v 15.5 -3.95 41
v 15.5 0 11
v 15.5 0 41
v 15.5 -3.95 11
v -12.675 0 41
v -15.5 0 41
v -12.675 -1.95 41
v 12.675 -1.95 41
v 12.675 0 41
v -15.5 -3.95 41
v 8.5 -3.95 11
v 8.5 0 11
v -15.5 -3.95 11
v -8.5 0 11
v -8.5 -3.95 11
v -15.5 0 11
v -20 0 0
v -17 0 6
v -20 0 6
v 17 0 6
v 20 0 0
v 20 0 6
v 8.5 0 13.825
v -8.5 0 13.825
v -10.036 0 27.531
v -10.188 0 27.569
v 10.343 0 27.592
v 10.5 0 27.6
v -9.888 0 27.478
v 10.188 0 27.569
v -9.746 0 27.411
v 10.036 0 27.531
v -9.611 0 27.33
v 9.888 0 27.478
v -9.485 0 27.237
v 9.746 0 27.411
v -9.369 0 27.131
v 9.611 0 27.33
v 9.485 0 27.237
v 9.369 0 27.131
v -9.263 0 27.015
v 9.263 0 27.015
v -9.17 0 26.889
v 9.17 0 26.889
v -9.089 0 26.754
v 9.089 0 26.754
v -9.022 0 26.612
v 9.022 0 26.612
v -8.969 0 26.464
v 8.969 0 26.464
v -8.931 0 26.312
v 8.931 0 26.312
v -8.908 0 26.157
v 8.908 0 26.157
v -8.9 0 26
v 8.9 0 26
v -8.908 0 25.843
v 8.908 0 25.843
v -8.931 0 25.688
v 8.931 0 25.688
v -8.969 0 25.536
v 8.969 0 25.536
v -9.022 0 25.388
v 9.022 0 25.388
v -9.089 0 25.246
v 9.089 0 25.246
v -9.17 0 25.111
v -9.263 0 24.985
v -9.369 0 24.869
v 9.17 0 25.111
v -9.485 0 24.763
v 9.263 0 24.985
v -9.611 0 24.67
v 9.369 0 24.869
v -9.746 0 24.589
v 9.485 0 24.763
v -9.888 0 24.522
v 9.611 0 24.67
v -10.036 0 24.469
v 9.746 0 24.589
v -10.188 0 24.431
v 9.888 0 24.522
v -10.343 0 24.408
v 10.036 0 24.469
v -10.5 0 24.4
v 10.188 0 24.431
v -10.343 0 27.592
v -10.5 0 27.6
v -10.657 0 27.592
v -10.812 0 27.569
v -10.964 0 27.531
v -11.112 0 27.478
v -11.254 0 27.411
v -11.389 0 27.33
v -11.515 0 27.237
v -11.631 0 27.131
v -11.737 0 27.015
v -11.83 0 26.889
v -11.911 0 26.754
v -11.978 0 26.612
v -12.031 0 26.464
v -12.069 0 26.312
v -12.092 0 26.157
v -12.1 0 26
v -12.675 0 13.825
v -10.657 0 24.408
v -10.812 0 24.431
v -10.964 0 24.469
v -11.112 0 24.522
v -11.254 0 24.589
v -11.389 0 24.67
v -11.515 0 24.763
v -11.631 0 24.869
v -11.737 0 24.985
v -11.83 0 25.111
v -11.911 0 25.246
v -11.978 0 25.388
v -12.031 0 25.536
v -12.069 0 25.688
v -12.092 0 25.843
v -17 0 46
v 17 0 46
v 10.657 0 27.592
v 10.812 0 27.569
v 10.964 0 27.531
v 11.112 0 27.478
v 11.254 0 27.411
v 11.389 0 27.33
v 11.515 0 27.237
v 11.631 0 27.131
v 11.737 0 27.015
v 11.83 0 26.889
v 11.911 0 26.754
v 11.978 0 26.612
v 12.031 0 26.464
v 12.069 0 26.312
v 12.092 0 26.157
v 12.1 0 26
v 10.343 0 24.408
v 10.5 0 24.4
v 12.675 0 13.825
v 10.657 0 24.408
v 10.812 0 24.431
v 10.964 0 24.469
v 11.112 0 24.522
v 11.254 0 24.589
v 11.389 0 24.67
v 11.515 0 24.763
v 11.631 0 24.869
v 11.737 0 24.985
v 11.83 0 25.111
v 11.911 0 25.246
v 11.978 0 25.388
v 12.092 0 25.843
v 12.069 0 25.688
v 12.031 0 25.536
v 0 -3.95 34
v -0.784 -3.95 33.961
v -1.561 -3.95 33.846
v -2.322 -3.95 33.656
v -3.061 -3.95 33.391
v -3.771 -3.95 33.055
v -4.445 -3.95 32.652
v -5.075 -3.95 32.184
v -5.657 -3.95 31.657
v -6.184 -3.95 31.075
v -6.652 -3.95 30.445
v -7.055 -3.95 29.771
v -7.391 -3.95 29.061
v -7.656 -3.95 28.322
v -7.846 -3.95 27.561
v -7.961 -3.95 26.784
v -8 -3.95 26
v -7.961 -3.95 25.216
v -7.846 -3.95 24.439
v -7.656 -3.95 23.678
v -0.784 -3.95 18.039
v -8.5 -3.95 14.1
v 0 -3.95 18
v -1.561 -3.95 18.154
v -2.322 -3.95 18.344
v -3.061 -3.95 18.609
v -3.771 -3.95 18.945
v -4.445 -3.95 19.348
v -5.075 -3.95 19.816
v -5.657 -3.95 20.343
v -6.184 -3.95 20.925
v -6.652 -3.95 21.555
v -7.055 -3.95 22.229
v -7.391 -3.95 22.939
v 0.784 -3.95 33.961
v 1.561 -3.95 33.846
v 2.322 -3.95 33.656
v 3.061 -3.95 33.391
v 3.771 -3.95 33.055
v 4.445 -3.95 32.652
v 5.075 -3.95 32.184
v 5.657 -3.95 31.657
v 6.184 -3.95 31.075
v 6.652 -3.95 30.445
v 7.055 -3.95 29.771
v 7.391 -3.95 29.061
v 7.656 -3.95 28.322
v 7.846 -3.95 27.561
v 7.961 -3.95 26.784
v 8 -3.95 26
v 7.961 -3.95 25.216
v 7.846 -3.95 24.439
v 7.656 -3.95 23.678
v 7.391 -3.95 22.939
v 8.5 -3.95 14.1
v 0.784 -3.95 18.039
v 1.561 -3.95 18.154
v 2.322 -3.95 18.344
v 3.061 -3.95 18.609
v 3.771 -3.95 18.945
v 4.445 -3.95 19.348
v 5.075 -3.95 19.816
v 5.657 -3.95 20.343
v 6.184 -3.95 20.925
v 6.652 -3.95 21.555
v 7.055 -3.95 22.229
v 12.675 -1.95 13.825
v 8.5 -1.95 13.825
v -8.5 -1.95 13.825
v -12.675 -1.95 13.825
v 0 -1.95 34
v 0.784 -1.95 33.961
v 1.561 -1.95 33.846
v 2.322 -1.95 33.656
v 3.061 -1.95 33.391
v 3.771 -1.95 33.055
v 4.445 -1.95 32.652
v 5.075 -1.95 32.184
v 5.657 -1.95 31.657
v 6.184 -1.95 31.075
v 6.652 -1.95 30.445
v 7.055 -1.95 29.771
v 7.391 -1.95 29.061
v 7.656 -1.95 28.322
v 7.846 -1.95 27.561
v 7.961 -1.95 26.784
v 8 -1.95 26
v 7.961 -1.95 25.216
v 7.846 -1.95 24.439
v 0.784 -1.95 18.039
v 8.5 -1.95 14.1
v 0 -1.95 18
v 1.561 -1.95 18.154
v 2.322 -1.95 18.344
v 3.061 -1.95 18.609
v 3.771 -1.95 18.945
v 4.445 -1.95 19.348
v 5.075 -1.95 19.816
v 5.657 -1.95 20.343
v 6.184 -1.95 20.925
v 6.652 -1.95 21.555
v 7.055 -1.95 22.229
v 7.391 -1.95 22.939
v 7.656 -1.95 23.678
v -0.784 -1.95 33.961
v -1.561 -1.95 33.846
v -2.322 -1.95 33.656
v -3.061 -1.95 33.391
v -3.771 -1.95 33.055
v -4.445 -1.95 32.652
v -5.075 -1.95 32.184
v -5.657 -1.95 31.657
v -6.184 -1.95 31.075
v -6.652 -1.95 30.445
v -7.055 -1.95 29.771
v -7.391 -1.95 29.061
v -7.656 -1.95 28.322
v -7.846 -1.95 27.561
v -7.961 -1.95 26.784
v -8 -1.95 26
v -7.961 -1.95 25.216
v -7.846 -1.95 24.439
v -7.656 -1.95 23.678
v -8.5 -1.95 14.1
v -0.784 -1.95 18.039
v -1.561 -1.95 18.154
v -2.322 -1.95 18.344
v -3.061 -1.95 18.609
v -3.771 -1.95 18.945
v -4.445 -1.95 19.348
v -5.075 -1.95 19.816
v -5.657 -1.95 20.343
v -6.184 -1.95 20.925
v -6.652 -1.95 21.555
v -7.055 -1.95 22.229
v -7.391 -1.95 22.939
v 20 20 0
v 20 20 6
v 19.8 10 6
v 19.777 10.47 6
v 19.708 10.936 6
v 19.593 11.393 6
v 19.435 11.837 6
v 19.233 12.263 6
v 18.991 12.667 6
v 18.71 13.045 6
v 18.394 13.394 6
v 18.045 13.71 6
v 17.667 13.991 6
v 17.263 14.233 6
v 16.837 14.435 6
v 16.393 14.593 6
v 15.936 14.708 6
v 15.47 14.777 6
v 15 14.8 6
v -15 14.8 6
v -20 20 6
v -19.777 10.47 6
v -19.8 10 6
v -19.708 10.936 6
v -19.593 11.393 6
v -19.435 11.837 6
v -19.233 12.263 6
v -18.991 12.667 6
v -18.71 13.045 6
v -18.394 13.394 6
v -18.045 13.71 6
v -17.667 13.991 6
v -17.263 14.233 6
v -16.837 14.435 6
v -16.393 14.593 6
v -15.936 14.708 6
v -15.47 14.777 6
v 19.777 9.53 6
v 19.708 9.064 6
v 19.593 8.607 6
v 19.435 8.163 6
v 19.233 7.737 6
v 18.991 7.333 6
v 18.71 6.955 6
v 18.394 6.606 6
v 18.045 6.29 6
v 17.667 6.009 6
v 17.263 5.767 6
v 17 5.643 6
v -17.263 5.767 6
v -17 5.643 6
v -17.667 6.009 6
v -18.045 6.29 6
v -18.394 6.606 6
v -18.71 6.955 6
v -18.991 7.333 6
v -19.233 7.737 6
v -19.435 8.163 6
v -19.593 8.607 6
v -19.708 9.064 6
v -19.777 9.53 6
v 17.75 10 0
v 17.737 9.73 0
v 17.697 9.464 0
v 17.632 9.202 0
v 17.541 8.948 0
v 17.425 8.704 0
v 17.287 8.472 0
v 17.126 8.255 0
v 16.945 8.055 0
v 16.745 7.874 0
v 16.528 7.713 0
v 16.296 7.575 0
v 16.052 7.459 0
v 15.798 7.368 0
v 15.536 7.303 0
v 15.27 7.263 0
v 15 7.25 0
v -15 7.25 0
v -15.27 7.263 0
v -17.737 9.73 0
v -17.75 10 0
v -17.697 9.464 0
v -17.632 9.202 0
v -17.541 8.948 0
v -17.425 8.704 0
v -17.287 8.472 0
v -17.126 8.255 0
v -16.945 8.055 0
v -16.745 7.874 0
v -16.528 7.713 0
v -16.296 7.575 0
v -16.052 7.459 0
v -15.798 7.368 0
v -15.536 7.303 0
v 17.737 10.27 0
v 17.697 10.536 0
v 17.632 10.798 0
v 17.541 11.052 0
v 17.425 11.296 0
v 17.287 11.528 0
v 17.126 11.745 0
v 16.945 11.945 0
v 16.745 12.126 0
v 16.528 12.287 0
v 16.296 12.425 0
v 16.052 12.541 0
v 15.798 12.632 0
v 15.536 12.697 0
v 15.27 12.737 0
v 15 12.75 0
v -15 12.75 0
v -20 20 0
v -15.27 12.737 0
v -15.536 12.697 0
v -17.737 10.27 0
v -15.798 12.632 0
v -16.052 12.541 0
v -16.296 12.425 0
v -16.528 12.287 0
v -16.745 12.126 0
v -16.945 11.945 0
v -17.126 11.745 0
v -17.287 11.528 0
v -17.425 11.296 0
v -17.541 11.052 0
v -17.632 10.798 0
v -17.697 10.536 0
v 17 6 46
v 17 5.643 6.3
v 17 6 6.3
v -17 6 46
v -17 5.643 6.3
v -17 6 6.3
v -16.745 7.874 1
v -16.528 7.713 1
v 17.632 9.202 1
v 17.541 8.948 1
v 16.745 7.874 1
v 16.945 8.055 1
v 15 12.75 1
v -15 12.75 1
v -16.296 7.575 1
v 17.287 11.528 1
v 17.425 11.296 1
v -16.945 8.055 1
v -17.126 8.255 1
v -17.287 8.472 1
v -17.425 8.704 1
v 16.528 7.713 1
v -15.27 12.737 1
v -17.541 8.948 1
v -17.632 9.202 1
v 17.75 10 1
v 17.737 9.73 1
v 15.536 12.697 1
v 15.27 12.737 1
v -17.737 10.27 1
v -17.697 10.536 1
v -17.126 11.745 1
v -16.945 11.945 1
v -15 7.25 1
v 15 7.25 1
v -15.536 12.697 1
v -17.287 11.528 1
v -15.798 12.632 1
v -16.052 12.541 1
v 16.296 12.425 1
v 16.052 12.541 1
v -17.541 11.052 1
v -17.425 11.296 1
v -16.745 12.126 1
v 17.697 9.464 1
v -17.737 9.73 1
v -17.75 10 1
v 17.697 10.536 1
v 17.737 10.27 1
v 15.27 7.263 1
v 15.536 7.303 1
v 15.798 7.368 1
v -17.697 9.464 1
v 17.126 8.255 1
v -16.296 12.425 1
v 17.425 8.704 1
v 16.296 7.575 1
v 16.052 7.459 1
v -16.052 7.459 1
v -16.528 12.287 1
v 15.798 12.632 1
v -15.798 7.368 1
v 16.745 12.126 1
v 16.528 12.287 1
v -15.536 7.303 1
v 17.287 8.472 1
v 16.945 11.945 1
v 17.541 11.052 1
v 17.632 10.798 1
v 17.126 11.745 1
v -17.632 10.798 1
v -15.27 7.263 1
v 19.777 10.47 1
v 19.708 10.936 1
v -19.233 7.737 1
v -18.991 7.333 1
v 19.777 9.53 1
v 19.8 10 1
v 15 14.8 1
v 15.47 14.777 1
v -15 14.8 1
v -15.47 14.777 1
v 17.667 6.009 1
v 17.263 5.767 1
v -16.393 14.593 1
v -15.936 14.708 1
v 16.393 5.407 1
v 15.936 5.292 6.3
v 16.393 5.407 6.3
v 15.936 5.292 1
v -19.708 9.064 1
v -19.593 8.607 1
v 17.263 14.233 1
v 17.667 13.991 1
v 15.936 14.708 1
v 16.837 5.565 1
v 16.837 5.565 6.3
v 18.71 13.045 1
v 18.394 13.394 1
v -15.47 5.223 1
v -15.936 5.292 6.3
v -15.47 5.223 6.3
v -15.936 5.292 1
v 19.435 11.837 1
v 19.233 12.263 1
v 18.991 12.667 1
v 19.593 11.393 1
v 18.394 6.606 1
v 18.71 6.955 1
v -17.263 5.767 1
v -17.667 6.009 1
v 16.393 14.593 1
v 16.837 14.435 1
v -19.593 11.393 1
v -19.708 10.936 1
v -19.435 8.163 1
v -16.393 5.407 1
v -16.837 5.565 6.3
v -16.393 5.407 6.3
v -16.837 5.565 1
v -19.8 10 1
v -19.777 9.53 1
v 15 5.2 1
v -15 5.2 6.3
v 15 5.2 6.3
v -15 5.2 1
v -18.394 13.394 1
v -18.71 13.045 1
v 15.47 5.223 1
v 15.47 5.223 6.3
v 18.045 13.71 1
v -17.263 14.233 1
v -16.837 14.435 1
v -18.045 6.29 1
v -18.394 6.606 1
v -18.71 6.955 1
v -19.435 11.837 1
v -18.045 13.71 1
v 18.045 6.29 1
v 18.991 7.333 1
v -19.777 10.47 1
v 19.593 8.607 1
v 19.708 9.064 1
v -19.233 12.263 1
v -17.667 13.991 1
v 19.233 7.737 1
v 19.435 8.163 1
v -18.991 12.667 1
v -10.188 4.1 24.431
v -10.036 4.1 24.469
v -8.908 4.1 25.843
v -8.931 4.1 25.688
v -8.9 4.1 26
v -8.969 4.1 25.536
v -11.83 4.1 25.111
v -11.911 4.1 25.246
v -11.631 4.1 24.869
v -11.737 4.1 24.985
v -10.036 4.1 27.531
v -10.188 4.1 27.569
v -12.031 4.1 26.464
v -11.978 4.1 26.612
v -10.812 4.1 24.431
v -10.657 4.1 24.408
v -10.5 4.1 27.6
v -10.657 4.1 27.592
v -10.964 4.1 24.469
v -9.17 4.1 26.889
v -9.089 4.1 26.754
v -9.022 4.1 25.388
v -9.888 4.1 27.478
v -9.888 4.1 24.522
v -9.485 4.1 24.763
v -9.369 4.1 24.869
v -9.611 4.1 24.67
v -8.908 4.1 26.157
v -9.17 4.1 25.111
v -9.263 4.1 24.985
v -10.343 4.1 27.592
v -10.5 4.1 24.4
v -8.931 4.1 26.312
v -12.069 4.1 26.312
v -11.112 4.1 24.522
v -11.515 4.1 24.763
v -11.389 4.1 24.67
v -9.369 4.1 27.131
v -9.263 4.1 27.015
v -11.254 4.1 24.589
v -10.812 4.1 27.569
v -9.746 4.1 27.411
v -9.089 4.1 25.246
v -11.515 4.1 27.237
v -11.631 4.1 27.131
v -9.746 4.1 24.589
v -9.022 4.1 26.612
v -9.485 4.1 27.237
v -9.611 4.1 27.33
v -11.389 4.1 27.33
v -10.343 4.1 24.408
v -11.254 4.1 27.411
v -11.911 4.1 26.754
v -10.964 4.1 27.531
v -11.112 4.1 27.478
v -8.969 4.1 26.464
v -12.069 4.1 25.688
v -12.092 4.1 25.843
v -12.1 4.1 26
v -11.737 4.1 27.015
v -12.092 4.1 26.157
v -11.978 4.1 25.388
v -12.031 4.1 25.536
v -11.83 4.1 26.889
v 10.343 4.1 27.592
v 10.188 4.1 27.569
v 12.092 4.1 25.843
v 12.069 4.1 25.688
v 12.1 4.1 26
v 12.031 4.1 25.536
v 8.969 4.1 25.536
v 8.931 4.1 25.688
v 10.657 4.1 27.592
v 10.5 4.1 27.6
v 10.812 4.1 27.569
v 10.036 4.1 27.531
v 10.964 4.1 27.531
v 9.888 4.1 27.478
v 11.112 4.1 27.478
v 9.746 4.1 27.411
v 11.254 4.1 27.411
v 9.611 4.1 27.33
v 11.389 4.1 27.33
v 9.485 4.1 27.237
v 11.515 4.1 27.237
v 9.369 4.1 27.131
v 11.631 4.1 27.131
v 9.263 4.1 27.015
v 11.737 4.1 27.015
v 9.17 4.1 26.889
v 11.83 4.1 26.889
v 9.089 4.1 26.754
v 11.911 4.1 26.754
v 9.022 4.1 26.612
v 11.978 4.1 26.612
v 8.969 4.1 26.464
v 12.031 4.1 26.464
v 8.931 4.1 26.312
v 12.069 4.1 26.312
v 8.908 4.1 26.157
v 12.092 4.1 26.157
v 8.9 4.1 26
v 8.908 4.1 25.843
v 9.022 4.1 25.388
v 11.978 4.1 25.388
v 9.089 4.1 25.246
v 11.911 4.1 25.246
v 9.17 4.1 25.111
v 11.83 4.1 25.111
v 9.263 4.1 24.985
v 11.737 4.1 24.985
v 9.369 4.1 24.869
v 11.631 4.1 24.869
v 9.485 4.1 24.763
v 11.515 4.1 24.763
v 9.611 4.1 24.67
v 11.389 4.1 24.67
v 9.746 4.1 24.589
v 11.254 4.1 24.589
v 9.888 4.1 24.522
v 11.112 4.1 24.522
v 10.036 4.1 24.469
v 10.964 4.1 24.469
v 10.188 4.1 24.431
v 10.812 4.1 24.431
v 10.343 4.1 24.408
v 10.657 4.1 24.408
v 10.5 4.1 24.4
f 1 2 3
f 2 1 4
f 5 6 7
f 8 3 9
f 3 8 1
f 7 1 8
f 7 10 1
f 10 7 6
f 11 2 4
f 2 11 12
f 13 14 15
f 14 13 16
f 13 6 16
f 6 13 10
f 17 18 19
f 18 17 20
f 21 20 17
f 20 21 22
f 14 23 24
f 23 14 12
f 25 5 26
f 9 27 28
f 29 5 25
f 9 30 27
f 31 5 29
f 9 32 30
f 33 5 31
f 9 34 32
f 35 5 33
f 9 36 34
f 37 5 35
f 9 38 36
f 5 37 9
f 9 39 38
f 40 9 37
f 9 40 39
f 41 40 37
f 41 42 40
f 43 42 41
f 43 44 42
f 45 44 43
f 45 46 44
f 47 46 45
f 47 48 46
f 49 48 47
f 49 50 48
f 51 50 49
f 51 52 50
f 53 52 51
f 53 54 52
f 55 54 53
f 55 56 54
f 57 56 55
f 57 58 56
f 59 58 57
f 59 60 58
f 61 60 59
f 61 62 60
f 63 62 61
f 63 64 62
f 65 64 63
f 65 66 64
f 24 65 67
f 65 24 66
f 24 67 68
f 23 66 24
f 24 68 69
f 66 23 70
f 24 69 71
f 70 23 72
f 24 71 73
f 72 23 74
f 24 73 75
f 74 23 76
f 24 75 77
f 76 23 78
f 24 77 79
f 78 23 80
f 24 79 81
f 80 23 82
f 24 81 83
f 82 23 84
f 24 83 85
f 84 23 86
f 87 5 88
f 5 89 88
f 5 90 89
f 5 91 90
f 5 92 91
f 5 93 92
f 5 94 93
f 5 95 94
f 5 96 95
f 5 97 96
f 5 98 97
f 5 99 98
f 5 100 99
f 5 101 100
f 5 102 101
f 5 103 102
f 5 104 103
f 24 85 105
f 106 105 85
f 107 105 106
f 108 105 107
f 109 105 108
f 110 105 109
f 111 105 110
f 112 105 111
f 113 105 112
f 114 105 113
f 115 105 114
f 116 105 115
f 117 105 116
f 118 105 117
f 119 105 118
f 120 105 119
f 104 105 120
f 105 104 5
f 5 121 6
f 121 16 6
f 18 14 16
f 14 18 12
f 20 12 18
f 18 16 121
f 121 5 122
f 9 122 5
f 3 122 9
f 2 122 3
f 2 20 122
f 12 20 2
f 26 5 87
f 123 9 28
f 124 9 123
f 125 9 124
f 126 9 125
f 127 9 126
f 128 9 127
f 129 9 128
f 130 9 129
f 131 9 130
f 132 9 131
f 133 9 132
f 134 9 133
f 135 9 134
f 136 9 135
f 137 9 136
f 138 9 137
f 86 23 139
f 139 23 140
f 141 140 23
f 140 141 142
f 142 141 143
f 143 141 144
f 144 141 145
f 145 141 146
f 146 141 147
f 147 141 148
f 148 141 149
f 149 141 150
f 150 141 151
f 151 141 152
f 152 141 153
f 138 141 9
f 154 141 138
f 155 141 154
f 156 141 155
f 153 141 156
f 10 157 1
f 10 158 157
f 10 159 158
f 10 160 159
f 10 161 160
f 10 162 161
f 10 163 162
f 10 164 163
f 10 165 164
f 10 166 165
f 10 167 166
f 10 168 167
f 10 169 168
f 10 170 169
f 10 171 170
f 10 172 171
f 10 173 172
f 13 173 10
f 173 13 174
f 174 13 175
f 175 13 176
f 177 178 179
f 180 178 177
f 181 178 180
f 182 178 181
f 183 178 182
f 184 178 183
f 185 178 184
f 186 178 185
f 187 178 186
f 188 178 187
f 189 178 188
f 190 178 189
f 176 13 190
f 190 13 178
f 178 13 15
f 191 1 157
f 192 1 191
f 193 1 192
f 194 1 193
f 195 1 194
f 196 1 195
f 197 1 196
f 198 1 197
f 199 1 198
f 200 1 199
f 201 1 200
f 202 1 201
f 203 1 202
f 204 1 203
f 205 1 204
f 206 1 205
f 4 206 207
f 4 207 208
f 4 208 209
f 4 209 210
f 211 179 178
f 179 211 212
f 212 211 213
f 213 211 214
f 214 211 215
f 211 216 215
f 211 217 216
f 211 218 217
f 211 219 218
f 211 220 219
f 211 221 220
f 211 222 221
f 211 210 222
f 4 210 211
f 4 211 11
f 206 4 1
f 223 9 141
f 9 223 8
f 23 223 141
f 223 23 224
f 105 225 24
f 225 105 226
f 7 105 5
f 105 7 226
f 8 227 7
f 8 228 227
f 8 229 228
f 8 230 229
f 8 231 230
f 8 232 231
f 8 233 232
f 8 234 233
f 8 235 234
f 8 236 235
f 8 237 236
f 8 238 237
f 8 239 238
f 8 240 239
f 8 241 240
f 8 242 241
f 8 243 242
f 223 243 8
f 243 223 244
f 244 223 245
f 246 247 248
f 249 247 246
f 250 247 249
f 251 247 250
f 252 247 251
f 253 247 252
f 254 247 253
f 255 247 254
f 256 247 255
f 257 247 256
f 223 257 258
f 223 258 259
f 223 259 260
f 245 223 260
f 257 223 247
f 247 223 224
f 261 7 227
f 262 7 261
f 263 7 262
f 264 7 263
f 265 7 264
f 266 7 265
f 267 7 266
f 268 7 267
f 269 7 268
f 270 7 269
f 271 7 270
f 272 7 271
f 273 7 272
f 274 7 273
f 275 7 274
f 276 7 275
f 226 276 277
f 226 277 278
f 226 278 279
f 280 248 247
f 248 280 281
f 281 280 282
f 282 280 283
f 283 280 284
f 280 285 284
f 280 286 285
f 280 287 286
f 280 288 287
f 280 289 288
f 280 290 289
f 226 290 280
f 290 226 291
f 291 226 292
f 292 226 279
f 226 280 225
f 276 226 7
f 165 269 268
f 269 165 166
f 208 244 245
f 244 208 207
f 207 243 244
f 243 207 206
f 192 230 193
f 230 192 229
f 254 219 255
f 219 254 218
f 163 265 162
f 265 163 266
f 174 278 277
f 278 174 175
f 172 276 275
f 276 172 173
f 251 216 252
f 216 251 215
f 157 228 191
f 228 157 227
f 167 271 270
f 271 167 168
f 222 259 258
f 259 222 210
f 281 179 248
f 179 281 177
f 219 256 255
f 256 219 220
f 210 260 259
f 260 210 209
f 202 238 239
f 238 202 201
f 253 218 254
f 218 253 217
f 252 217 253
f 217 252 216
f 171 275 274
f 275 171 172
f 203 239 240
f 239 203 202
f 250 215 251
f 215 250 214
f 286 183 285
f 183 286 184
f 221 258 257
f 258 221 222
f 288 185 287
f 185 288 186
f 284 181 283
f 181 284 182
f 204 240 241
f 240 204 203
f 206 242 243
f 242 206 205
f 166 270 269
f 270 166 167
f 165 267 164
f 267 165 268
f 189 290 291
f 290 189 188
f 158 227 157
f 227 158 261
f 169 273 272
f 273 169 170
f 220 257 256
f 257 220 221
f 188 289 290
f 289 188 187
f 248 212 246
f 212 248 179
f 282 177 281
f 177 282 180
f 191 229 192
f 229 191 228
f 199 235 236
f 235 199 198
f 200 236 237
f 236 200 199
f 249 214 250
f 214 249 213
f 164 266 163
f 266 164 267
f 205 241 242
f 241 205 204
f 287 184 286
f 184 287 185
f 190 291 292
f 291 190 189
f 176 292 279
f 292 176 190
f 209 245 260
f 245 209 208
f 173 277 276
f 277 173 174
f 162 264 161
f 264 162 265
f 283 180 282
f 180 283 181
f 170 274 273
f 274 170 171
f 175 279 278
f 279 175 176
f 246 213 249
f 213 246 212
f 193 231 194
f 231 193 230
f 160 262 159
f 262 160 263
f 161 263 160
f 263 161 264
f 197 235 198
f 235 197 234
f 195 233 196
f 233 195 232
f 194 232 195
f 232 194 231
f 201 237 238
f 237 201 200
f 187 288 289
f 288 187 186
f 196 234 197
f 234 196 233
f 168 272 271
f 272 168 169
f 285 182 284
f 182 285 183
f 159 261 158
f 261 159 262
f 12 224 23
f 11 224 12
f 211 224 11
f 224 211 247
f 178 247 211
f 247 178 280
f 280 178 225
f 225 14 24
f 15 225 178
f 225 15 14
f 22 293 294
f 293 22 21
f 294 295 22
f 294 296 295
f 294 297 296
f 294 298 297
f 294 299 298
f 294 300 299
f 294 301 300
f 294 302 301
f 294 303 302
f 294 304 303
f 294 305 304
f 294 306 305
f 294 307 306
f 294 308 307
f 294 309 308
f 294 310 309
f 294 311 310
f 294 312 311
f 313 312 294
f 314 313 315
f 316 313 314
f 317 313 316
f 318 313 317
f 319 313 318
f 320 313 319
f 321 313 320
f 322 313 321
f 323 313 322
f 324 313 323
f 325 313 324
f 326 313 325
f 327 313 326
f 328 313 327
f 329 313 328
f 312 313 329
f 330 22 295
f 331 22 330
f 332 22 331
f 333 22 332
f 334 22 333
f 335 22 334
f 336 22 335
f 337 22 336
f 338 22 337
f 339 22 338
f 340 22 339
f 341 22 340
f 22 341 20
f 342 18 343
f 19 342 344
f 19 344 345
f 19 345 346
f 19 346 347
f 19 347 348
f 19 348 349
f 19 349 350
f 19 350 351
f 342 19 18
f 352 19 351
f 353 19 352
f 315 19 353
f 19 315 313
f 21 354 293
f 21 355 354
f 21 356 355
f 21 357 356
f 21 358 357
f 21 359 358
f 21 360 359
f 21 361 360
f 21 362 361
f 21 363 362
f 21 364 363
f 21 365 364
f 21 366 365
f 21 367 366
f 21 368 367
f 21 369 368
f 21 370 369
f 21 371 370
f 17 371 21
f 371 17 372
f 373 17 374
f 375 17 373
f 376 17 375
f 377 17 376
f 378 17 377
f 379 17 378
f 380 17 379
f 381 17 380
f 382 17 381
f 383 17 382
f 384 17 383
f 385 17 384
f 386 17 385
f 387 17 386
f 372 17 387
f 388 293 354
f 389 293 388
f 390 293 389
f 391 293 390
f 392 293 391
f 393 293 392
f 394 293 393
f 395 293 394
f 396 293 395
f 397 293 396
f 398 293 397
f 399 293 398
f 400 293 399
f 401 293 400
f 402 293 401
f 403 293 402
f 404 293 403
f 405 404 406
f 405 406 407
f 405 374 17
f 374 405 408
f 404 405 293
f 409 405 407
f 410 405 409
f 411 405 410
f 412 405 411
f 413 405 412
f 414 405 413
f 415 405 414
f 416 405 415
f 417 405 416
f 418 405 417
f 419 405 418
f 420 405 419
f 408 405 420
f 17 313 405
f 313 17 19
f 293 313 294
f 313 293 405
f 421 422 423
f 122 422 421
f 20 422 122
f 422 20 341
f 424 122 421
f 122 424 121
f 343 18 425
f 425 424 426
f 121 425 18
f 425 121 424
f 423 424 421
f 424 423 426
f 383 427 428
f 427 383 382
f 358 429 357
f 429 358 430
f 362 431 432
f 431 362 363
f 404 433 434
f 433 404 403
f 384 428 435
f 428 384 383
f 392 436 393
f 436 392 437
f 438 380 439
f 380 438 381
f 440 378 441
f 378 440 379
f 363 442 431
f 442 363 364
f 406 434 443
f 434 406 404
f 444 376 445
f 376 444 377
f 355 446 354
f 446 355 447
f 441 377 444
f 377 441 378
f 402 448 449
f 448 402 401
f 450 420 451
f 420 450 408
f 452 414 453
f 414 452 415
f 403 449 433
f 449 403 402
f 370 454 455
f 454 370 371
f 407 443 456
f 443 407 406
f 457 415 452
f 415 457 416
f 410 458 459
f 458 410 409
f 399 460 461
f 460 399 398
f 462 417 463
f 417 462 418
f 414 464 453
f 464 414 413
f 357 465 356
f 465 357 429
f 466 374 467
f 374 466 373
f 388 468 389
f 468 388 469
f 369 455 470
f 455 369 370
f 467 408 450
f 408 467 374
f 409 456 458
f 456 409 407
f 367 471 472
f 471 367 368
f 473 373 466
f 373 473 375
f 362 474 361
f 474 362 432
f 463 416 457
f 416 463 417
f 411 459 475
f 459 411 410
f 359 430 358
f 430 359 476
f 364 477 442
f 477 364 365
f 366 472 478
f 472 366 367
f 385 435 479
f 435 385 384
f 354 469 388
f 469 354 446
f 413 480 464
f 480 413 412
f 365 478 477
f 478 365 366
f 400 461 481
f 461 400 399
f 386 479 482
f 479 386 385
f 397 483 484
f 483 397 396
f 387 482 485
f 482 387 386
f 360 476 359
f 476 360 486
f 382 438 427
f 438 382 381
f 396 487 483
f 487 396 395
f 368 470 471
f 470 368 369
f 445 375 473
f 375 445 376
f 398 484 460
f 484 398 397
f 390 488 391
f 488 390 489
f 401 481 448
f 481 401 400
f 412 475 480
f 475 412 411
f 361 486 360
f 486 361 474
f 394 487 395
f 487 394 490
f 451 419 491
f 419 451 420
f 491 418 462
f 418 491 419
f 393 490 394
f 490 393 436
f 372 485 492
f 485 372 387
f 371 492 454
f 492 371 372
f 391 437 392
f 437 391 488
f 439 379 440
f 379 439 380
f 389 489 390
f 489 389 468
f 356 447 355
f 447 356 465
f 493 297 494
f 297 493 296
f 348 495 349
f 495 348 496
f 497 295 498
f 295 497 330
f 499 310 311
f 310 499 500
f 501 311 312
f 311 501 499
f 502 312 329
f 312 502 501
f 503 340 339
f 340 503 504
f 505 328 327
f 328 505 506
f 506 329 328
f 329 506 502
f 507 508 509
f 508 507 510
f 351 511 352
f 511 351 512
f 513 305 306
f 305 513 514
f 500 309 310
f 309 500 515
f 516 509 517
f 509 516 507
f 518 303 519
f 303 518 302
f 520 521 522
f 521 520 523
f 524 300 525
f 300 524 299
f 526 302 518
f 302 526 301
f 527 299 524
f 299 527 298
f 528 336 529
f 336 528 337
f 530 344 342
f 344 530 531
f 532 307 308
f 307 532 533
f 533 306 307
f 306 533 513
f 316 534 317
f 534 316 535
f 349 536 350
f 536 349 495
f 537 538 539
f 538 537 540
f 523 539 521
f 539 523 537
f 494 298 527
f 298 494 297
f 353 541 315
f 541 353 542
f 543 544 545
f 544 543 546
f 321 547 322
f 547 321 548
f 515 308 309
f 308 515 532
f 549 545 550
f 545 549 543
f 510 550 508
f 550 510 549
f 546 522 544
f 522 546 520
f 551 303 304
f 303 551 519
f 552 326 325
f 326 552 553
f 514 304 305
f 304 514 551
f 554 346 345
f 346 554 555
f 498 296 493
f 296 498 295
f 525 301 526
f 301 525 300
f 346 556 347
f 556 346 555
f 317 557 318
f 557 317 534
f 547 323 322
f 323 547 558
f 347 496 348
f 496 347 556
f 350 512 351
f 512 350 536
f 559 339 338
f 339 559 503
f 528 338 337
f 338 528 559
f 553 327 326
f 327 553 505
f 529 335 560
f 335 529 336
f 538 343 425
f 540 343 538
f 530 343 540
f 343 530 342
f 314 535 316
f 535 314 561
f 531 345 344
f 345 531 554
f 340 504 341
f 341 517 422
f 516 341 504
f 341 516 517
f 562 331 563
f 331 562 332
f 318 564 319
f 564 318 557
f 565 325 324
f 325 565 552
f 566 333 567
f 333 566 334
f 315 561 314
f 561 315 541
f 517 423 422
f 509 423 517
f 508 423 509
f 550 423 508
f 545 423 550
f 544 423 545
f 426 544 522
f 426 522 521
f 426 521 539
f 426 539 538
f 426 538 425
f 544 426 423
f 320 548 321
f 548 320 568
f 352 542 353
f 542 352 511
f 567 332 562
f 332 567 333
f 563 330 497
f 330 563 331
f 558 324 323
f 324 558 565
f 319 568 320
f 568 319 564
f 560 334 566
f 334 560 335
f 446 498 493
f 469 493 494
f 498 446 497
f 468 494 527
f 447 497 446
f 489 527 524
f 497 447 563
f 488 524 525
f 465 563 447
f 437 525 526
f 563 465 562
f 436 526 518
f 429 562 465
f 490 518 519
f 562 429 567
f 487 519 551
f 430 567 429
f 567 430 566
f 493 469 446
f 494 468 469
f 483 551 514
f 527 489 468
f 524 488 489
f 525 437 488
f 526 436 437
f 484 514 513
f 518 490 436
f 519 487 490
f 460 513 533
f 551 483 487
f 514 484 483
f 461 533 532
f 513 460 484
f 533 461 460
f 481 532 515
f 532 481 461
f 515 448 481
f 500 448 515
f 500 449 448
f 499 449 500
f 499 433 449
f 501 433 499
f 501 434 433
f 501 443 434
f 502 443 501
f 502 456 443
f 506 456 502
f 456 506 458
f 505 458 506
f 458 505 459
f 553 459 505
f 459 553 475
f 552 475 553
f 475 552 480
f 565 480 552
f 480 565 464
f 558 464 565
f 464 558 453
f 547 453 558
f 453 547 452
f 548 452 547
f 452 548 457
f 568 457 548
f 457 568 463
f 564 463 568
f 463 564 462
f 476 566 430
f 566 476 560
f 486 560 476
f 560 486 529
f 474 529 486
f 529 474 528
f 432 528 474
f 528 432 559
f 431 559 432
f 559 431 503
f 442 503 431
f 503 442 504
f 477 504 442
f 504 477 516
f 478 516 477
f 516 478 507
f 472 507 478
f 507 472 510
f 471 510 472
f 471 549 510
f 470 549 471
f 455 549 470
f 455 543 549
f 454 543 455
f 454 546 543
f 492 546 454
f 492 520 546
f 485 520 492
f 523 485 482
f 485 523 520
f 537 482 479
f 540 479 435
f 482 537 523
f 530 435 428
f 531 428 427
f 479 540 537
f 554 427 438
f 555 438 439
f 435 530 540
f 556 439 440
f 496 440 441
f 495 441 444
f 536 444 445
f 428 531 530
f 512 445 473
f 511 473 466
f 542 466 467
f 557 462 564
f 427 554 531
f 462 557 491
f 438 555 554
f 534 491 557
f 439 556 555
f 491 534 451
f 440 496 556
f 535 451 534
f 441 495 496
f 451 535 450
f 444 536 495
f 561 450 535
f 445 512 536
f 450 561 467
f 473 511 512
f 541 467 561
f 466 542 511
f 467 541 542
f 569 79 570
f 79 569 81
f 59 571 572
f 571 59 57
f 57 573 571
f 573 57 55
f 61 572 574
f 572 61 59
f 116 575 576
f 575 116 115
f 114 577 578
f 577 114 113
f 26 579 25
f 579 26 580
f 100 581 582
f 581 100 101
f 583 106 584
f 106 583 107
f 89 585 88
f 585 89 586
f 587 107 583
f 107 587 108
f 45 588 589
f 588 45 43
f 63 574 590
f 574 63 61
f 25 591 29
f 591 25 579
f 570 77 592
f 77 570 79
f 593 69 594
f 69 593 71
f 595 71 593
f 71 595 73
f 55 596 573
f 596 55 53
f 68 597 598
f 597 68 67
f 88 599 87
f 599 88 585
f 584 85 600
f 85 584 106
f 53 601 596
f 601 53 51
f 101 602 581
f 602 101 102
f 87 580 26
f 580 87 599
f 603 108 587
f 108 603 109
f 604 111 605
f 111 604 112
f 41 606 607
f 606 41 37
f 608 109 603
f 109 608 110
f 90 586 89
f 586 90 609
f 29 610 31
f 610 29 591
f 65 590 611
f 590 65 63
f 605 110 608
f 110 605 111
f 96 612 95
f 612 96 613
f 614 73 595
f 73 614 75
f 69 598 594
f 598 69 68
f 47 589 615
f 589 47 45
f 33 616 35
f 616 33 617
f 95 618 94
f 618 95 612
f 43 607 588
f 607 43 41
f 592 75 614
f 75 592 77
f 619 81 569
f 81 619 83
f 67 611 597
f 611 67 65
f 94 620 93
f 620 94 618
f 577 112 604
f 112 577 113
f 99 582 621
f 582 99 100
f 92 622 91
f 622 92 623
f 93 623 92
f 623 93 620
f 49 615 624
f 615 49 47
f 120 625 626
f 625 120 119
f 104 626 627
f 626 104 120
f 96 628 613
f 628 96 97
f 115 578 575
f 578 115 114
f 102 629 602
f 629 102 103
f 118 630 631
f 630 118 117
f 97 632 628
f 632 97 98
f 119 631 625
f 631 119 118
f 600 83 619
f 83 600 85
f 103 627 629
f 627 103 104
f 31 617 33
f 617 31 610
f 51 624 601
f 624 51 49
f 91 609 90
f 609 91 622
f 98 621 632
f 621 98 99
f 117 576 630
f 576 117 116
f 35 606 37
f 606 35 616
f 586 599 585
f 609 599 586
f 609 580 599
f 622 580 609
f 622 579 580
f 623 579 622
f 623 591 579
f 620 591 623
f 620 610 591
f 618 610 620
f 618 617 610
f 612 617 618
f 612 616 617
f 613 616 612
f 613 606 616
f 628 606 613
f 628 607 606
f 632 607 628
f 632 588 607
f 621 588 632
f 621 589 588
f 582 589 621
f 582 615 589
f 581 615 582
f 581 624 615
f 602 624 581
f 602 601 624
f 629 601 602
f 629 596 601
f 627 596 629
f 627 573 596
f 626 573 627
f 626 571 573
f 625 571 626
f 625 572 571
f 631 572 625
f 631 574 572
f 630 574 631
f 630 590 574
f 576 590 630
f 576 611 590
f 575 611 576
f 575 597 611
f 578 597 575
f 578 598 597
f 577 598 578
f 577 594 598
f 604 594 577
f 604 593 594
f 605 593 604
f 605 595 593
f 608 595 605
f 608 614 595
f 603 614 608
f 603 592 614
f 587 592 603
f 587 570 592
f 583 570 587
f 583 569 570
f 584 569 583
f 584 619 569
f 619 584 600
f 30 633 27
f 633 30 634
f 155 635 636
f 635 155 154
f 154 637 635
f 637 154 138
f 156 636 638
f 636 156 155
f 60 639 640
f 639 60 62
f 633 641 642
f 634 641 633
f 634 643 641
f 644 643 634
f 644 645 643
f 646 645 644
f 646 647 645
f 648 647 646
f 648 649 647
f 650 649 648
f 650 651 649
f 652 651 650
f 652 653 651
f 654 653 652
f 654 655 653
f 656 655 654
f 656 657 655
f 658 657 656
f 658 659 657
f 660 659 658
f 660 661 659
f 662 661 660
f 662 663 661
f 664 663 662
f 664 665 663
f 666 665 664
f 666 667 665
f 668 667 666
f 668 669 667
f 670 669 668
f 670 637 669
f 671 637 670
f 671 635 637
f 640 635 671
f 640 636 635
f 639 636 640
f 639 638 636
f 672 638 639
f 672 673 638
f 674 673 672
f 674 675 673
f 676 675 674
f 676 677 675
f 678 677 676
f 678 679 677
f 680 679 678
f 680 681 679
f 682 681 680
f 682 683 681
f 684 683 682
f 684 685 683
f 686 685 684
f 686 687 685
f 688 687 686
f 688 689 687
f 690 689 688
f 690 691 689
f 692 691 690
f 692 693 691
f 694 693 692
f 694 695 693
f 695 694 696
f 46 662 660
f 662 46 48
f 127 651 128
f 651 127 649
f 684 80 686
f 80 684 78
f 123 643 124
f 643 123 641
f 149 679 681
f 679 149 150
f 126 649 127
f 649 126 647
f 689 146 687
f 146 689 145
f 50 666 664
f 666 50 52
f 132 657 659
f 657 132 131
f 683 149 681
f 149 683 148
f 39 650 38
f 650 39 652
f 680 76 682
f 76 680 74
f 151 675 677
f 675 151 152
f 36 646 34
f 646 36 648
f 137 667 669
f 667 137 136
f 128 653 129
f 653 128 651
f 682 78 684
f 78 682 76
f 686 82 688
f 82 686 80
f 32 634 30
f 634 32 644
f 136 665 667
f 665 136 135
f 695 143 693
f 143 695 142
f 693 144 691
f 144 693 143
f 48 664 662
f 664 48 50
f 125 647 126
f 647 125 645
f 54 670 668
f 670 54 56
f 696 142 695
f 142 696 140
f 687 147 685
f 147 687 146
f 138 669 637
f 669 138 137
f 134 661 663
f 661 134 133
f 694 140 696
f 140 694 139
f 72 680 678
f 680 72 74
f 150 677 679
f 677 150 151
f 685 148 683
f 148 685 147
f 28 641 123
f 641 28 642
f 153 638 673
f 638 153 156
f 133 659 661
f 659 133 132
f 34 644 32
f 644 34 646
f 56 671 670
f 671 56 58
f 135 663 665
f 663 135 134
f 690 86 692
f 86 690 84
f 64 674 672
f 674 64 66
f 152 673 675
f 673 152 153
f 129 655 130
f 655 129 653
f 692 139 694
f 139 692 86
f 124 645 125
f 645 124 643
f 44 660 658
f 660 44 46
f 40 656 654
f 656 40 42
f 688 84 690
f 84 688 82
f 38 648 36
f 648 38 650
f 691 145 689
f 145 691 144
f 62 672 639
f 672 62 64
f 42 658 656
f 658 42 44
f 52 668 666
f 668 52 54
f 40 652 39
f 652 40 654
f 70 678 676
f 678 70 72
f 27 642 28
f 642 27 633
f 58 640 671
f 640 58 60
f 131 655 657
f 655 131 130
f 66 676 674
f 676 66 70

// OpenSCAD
// file: params.scad
// =============================================================================
//  BUGLOCK printed-bracket parameters
//  Every structural number here traces to docs/laser-fly-turret-design.md §4.5.
//  Units: millimetres. Target printer: Bambu Lab P1S (256^3 bed, enclosed).
//  Material: PETG minimum, ASA preferred near the laser.  NEVER PLA (§4.5 C3).
// =============================================================================

$fn = 64;                 // curve smoothness for render/export

// ---- general print process (P1S, 0.4 mm nozzle) --------------------------
wall        = 3.2;        // ~8 perimeters — stiffness governs, not strength
gen_clr     = 0.20;       // clearance between mating printed features

// ---- 2020 / 2040 aluminum extrusion interface ----------------------------
ext_w       = 20;         // 2020 profile face width (rail top the foot sits on)
m5_clear    = 5.5;        // clearance hole for an M5 bolt into a T-nut
m5_head     = 9.6;        // M5 socket-head cap dia (counterbore)
m5_head_h   = 5.0;        // M5 head height (counterbore depth)

// ---- heat-set brass inserts (melt-in hole diameters) ---------------------
// Verify against YOUR inserts; these are typical for CNC Kitchen / generic.
ins_m2_d    = 3.2;  ins_m2_h = 4.0;
ins_m3_d    = 4.0;  ins_m3_h = 6.0;
ins_m4_d    = 5.7;  ins_m4_h = 8.0;

// =============================================================================
//  GALVO PAD  — §4.5 Constraint 1 (static stiffness)
//  Cantilever calc: slope theta = P*L^2/(2*E*I), I = b*h^3/12, so theta ~ 1/h^3.
//  Under the ~4 N scanner block a >=12 mm pad flexes ~0.35 mrad (vs 1.17 mrad at
//  8 mm) — inside the 0.5 mrad frame budget. The pad is a SHORT SOLID pedestal
//  (load in compression, short moment arm), not a slender arm.
// =============================================================================
galvo_ped_h      = 16;    // pedestal height — keep SHORT (short moment arm)
galvo_ped_h_max  = 20;    // do not exceed: taller = longer lever = more drift
galvo_pad_t_min  = 12;    // informational: min effective load-path thickness

// Footprint of YOUR galvo scanner block — MEASURE and edit these two:
galvo_block_w    = 66;    // block width  (X)
galvo_block_d    = 40;    // block depth  (Y)

// Galvo block bolt pattern — MEASURE your kit (most 20-30 kpps sets are M4):
galvo_bolt_dx    = 50;    // bolt spacing across X
galvo_bolt_dy    = 28;    // bolt spacing across Y
galvo_bolt_ins   = ins_m4_d;
galvo_bolt_ins_h = ins_m4_h;

galvo_margin     = 11;    // pad border beyond the block (room for hold-downs)
galvo_hold_edge  = 7;     // hold-down bolt inset from the pad edge
cable_slot_w     = 12;    // cable relief channel width
cable_slot_h     = 5;     // cable relief channel height (from base up)

// =============================================================================
//  CAMERA MOUNT — §4.5 Constraint 2 & 4
//  Baseline (60 mm) is carried on the ALUMINUM rail, not plastic: the foot has a
//  SLOT so you slide each camera to an exact baseline, then lock it. Print two.
//  PCB is captured in a lipped pocket (a datum) so it re-seats repeatably.
// =============================================================================
// Raspberry Pi Camera v2 (IMX219) board — MEASURE yours; boards vary slightly:
cam_pcb_w        = 25.0;
cam_pcb_h        = 24.0;
cam_pcb_t        = 1.6;
cam_pocket_clr   = 0.35;  // pocket oversize so the PCB drops in cleanly

cam_lip_w        = 3.0;   // pocket wall/lip width around the PCB
cam_lip_front    = 2.0;   // front retaining lip that traps the PCB
cam_window_d     = 16.0;  // front opening — clears the lens & its field of view
cam_ribbon_w     = 17.0;  // FFC ribbon exit slot at the pocket bottom

cam_foot_len     = 40;    // foot length along the rail (X)
cam_base_t       = 6;     // foot thickness
cam_plate_t      = 6;     // vertical plate thickness (>= ins_m2_h so inserts fit)
cam_plate_h      = 40;    // vertical plate height
cam_plate_w      = 34;    // vertical plate width

cam_slot_len     = 30;    // baseline-adjust travel (slotted foot hole)
cam_toe_in_deg   = 0;     // 0 = parallel optics (rectified stereo). small toe ok
cam_use_screws   = true;  // M2 heat-set inserts to bolt the PCB down
cam_hole_dx      = 21;    // PCB mount-hole horizontal spacing — MEASURE yours
cam_hole_dz      = 0;     // vertical offset of the mount holes from pocket center

cam_center_z     = cam_base_t + cam_plate_h / 2;   // PCB centre height (derived)
// main file
// =============================================================================
//  BUGLOCK — stereo camera mount  (docs/laser-fly-turret-design.md §4.5 C2/C4)
//  An L-bracket that clamps to the TOP of a horizontal 2020 rail. The foot has a
//  SLOT so you slide it along the rail to an exact 60 mm baseline (baseline is
//  carried by the ALUMINUM, not the plastic) and lock it with one M5 T-nut bolt.
//  The Pi Cam v2 PCB drops into a lipped pocket (a repeatable datum) and is held
//  by two M2 heat-set inserts. Print TWO. Lens looks down the -Y axis (downrange).
//
//  Not compile-checked in the build sandbox (no OpenSCAD) — verify in OpenSCAD /
//  Bambu Studio before printing.
// =============================================================================
include <params.scad>

module insert_hole(d, h) { cylinder(d = d, h = h); }

// cam_center_z is defined in params.scad (derived from cam_base_t + cam_plate_h)

// PCB pocket, built about its own centre (back face at Y=0, lens out -Y) --------
module cam_pocket() {
    ow = cam_pcb_w + 2 * cam_lip_w;
    oh = cam_pcb_h + 2 * cam_lip_w;
    od = cam_pcb_t + cam_pocket_clr + cam_lip_front;   // total depth in Y
    difference() {
        // outer frame
        translate([-ow / 2, -od, -oh / 2]) cube([ow, od, oh]);

        // PCB cavity: open at the back (onto the plate) and open at the TOP to
        // slide the board in; front lip (cam_lip_front) retains it.
        translate([-(cam_pcb_w + cam_pocket_clr) / 2,
                   -(cam_pcb_t + cam_pocket_clr),
                   -(cam_pcb_h + cam_pocket_clr) / 2])
            cube([cam_pcb_w + cam_pocket_clr,
                  cam_pcb_t + cam_pocket_clr + 0.2,
                  (cam_pcb_h + cam_pocket_clr) / 2 + oh]);   // extend up = open top

        // front window: clears the lens and its field of view
        translate([0, -od - 0.1, 0]) rotate([-90, 0, 0])
            cylinder(d = cam_window_d, h = cam_lip_front + 0.4);

        // ribbon (FFC) exit slot through the bottom lip
        translate([-cam_ribbon_w / 2, -od - 0.1, -oh / 2 - 0.1])
            cube([cam_ribbon_w, od + 0.2, cam_lip_w + 0.2]);
    }
}

module foot_slot() {
    translate([0, ext_w / 2, -0.1]) {
        hull() {
            translate([-cam_slot_len / 2, 0, 0]) cylinder(d = m5_clear, h = cam_base_t + 0.2);
            translate([ cam_slot_len / 2, 0, 0]) cylinder(d = m5_clear, h = cam_base_t + 0.2);
        }
        translate([0, 0, cam_base_t - m5_head_h + 0.1])
            hull() {
                translate([-cam_slot_len / 2, 0, 0]) cylinder(d = m5_head, h = m5_head_h + 0.3);
                translate([ cam_slot_len / 2, 0, 0]) cylinder(d = m5_head, h = m5_head_h + 0.3);
            }
    }
}

module camera_mount() {
    difference() {
        union() {
            // foot on the rail
            translate([-cam_foot_len / 2, 0, 0]) cube([cam_foot_len, ext_w, cam_base_t]);
            // vertical plate (merges with the foot front)
            translate([-cam_plate_w / 2, 0, 0]) cube([cam_plate_w, cam_plate_t, cam_base_t + cam_plate_h]);
            // camera pocket, placed at PCB height and toed in if requested
            translate([0, 0, cam_center_z]) rotate([0, 0, cam_toe_in_deg]) cam_pocket();
        }

        // baseline-adjust slot in the foot
        foot_slot();

        // M2 inserts to bolt the PCB to the plate (from the front)
        if (cam_use_screws)
            for (sx = [-1, 1])
                translate([0, 0, cam_center_z]) rotate([0, 0, cam_toe_in_deg])
                    translate([sx * cam_hole_dx / 2, -0.2, cam_hole_dz])
                        rotate([-90, 0, 0]) insert_hole(ins_m2_d, ins_m2_h + 0.3);
    }
}

camera_mount();
